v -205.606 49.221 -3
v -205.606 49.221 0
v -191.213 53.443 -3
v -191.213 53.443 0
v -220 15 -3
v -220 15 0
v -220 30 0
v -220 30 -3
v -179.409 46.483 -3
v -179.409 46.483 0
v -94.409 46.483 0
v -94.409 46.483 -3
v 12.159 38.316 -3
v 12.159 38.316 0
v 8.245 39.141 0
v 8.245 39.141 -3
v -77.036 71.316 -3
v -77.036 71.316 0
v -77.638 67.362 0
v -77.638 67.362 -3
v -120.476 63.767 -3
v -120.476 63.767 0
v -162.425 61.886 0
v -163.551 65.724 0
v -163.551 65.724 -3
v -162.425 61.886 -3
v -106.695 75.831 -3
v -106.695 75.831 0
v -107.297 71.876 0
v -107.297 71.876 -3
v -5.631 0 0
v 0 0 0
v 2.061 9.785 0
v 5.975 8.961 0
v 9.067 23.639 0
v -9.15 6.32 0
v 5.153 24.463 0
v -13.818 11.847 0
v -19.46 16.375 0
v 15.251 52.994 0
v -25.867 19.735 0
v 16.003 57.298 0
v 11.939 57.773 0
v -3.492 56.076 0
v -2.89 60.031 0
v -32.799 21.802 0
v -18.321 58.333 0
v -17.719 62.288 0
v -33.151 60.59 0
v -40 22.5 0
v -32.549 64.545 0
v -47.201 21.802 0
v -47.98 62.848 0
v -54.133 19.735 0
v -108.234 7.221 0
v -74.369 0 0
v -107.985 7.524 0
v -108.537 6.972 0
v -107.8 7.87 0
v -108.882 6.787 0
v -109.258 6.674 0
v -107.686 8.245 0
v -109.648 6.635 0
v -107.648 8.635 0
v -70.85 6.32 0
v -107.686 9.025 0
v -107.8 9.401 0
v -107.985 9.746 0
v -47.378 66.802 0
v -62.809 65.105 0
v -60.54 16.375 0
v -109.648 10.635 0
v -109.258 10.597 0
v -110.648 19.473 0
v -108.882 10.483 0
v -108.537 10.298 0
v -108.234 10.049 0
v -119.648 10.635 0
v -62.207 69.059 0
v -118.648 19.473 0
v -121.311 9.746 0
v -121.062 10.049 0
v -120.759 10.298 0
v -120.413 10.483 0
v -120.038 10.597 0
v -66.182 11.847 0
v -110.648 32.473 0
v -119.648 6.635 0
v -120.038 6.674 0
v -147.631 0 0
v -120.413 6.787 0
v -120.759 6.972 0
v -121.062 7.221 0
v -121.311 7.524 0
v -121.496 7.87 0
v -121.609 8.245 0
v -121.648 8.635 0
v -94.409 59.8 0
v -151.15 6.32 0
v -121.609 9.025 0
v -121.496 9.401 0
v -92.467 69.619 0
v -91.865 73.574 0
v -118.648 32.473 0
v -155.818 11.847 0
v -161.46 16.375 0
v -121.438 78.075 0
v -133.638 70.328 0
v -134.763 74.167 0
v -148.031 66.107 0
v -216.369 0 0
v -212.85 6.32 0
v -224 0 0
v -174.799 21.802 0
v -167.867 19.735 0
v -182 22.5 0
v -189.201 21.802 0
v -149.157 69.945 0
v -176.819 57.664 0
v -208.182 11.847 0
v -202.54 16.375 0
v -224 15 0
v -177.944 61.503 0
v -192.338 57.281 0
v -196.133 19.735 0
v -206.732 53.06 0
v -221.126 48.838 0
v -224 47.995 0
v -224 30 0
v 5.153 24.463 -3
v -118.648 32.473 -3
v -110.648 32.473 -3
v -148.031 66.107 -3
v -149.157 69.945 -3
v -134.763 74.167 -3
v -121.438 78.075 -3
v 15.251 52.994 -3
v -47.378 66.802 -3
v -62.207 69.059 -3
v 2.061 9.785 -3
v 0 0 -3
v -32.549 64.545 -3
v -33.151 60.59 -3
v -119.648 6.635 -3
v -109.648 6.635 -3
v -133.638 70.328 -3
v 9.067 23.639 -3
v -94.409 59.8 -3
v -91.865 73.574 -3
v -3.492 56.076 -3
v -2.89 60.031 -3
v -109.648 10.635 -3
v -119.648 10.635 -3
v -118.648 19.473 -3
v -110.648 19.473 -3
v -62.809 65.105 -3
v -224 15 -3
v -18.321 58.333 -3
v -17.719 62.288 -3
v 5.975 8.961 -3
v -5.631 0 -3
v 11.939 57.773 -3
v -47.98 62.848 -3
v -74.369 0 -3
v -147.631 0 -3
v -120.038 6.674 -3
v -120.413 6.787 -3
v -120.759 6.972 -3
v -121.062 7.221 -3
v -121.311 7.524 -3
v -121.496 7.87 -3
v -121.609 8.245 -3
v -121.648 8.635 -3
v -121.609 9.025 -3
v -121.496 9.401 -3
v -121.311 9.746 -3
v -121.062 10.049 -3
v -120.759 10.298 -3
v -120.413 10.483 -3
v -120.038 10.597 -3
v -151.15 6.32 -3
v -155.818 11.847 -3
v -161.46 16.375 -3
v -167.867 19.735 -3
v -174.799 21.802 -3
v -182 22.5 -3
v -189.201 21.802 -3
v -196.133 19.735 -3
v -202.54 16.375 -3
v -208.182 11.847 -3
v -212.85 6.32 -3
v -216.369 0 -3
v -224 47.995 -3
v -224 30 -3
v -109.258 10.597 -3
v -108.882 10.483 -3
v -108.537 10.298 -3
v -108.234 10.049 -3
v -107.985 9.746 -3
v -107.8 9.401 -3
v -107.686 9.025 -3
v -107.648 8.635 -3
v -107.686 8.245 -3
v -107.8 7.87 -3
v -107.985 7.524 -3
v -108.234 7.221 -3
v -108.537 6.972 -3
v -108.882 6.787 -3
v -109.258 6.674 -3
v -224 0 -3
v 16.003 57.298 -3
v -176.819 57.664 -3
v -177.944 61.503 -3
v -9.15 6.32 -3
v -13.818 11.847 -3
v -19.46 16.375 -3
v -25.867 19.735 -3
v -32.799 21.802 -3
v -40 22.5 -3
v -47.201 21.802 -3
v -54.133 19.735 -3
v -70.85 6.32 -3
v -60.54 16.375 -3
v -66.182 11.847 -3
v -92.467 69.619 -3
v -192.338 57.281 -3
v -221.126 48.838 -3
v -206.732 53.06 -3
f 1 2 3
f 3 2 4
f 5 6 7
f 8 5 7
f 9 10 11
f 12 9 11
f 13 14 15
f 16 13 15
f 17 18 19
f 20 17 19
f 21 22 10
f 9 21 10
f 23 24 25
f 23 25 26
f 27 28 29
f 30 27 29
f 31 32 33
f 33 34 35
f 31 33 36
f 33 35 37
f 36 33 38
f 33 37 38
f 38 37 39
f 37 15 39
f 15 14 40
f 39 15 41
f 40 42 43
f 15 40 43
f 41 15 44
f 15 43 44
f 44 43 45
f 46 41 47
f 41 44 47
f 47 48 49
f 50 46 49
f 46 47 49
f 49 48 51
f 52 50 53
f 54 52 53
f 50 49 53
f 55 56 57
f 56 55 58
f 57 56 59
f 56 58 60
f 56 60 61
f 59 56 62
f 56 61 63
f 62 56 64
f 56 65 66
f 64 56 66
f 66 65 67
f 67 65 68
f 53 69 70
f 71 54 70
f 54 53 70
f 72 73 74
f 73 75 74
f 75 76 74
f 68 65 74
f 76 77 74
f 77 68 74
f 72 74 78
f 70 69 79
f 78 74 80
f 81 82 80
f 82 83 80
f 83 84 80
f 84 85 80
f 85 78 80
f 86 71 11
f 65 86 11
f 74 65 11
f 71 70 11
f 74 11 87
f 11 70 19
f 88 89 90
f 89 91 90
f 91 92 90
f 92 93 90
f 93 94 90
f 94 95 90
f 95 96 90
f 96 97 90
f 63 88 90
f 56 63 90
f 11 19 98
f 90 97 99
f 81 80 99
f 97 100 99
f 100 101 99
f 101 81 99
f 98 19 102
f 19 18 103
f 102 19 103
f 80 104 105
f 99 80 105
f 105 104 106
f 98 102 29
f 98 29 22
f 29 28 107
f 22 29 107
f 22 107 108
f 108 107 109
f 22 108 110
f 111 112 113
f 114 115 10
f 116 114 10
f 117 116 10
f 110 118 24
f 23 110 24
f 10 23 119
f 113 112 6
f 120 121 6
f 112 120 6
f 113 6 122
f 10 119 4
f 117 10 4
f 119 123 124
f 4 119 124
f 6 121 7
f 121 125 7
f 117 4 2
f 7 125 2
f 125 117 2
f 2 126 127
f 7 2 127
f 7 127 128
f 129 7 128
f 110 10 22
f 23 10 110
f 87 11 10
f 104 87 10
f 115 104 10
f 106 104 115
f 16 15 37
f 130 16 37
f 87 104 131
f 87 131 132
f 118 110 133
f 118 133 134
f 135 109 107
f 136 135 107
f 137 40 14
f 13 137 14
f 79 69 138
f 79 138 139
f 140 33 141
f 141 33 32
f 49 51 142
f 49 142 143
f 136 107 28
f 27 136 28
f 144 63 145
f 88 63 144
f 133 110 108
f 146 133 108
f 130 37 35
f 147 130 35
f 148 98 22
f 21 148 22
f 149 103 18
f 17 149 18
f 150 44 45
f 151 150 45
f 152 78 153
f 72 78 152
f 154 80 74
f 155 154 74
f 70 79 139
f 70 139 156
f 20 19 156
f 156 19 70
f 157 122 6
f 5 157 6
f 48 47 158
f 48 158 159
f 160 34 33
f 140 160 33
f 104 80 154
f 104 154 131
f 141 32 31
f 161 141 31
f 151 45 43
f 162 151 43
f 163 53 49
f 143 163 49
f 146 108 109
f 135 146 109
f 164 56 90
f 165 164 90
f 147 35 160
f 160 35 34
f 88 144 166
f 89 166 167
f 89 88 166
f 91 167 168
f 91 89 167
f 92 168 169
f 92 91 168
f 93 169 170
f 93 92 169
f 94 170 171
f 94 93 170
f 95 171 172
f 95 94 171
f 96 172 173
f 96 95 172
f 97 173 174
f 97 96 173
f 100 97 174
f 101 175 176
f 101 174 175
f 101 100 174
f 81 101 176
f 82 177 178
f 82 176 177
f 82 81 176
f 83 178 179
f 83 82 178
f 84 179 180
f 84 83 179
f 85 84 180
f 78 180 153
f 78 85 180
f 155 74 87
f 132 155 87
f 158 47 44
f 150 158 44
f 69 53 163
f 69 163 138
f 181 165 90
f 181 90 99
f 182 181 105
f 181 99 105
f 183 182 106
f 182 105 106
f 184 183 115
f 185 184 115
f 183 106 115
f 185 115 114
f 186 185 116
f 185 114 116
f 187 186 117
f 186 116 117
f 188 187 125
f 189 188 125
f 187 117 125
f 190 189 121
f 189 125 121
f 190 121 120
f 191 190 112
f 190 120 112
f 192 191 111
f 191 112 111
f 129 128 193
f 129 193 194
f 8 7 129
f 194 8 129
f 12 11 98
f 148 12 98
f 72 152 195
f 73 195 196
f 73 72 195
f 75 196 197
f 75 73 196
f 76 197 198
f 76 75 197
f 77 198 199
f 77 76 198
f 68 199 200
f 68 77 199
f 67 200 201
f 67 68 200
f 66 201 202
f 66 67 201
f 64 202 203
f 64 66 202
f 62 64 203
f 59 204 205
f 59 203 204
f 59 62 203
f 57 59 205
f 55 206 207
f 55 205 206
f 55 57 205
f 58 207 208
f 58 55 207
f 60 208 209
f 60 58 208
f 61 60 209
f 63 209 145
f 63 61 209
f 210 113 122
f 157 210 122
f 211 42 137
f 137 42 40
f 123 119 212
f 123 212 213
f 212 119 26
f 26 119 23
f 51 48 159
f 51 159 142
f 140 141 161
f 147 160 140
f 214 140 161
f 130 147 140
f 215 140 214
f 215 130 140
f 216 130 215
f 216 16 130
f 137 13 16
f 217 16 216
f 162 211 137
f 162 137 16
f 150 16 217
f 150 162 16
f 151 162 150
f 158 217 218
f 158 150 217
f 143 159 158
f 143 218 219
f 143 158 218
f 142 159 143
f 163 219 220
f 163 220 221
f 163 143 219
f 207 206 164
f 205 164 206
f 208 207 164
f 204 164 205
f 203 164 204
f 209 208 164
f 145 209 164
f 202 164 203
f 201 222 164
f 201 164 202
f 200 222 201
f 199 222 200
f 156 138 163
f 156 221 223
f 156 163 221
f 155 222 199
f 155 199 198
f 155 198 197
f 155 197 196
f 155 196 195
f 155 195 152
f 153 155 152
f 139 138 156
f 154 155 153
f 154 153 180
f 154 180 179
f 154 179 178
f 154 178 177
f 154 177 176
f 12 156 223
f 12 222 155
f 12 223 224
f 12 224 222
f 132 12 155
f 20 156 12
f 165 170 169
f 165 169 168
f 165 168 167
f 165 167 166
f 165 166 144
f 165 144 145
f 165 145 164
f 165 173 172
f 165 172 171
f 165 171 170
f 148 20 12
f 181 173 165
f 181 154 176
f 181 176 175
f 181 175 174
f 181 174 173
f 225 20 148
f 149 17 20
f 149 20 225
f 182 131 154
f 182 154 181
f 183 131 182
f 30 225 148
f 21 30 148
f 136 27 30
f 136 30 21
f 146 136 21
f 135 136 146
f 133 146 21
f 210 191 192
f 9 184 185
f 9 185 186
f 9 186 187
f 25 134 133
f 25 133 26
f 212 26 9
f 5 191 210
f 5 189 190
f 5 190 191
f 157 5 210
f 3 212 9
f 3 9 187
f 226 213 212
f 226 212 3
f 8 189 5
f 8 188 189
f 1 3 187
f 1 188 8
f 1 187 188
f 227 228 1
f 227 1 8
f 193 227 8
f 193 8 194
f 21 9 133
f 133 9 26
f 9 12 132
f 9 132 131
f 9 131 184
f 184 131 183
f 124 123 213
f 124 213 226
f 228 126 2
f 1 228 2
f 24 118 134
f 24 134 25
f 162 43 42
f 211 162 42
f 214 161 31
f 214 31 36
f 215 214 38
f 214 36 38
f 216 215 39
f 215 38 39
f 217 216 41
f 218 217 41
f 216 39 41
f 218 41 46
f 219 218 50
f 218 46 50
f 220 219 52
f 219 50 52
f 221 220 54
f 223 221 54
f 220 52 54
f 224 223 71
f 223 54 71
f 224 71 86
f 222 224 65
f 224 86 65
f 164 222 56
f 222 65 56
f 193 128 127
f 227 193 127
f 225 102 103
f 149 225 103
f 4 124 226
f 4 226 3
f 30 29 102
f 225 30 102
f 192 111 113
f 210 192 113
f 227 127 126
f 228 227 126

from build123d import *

# Parameters (mm, degrees)
BOSS_EXTRUDE1_DEPTH = 3
SKETCH2_R           = 37.5
CUT_EXTRUDE1_DEPTH  = 3
SKETCH3_W           = 4
SKETCH3_H           = 15
BOSS_EXTRUDE4_DEPTH = 3
SKETCH4_W           = 8
SKETCH4_H           = 13
CUT_EXTRUDE2_DEPTH  = 10
CUT_EXTRUDE3_DEPTH  = 10


with BuildPart() as part:
    # Sketch1 → Boss-Extrude1 (new body)
    with BuildSketch(Plane.XY):
        Polygon((11.337032692, 53.818878563), (0, 0), (-220, 0), (-220, 45), (-121.162967308, 73.986910298), align=None)
        Polygon((-94.409209541, 46.483265917), (-94.409209541, 59.799500594), (-120.476048116, 63.767174765), (-179.409209541, 46.483265917), align=None, mode=Mode.SUBTRACT)
    extrude(amount=-BOSS_EXTRUDE1_DEPTH)

    # Sketch2 → Cut-Extrude1 (cut)
    with BuildSketch(Plane.XY):
        with Locations((-182, -15)):
            Circle(SKETCH2_R)
        with Locations((-40, -15)):
            Circle(SKETCH2_R)
    extrude(amount=-CUT_EXTRUDE1_DEPTH, mode=Mode.SUBTRACT)

    # Sketch3 → Boss-Extrude4 (add)
    with BuildSketch(Plane.XY):
        Polygon((-206.731962629, 53.05972607), (-205.606257375, 49.221394704), (-220, 45), (-220, 30), (-224, 30), (-224, 45), (-224, 47.99535863), (-221.125705254, 48.838331367), align=None)
        Polygon((-192.338220004, 57.281120774), (-191.21251475, 53.442789407), (-176.818772125, 57.664184111), (-177.944477379, 61.502515478), align=None)
        Polygon((-121.437734985, 78.074804512), (-106.694649955, 75.830736536), (-107.296563448, 71.876283331), (-121.162967308, 73.986910298), (-133.63754425, 70.328368222), (-134.763249504, 74.166699588), align=None)
        Polygon((-77.03625092, 71.316385344), (-77.638164413, 67.361932139), (-92.46736393, 69.619107735), (-91.865450438, 73.57356094), align=None)
        Polygon((-3.492166825, 56.076054159), (-2.890253333, 60.030507363), (11.938946184, 57.773331767), (16.003099334, 57.297974706), (15.251132951, 52.994367094), (12.159214944, 38.316491123), (8.245114685, 39.141002591), (11.337032692, 53.818878563), align=None)
        Polygon((-18.321366343, 58.333229755), (-17.719452851, 62.287682959), (-32.548652368, 64.544858556), (-33.15056586, 60.590405351), align=None)
        Polygon((-163.550734754, 65.723910181), (-162.4250295, 61.885578815), (-148.031286875, 66.106973518), (-149.156992129, 69.945304885), align=None)
        Polygon((-47.979765378, 62.847580947), (-47.377851886, 66.802034152), (-62.207051403, 69.059209748), (-62.808964895, 65.104756543), align=None)
        with Locations((-222, 7.5)):
            Rectangle(SKETCH3_W, SKETCH3_H)
        Polygon((5.153196678, 24.463126619), (9.067296937, 23.638615151), (5.97537893, 8.960739179), (2.061278671, 9.785250648), align=None)
    extrude(amount=-BOSS_EXTRUDE4_DEPTH)

    # Sketch4 → Cut-Extrude2 (cut)
    with BuildSketch(Plane.XY):
        with Locations((-114.647846568, 25.97260243)):
            Rectangle(SKETCH4_W, SKETCH4_H)
    extrude(amount=-CUT_EXTRUDE2_DEPTH, mode=Mode.SUBTRACT)

    # Sketch5 → Cut-Extrude3 (cut)
    with BuildSketch(Plane.XY):
        with BuildLine():
            Line((-119.647846568, 10.635241704), (-109.647846568, 10.635241704))
            ThreePointArc((-109.647846568, 10.635241704), (-107.647846568, 8.635241704), (-109.647846568, 6.635241704))
            Line((-109.647846568, 6.635241704), (-119.647846568, 6.635241704))
            ThreePointArc((-119.647846568, 6.635241704), (-121.647846568, 8.635241704), (-119.647846568, 10.635241704))
        make_face()
    extrude(amount=-CUT_EXTRUDE3_DEPTH, mode=Mode.SUBTRACT)


solid = part.part
